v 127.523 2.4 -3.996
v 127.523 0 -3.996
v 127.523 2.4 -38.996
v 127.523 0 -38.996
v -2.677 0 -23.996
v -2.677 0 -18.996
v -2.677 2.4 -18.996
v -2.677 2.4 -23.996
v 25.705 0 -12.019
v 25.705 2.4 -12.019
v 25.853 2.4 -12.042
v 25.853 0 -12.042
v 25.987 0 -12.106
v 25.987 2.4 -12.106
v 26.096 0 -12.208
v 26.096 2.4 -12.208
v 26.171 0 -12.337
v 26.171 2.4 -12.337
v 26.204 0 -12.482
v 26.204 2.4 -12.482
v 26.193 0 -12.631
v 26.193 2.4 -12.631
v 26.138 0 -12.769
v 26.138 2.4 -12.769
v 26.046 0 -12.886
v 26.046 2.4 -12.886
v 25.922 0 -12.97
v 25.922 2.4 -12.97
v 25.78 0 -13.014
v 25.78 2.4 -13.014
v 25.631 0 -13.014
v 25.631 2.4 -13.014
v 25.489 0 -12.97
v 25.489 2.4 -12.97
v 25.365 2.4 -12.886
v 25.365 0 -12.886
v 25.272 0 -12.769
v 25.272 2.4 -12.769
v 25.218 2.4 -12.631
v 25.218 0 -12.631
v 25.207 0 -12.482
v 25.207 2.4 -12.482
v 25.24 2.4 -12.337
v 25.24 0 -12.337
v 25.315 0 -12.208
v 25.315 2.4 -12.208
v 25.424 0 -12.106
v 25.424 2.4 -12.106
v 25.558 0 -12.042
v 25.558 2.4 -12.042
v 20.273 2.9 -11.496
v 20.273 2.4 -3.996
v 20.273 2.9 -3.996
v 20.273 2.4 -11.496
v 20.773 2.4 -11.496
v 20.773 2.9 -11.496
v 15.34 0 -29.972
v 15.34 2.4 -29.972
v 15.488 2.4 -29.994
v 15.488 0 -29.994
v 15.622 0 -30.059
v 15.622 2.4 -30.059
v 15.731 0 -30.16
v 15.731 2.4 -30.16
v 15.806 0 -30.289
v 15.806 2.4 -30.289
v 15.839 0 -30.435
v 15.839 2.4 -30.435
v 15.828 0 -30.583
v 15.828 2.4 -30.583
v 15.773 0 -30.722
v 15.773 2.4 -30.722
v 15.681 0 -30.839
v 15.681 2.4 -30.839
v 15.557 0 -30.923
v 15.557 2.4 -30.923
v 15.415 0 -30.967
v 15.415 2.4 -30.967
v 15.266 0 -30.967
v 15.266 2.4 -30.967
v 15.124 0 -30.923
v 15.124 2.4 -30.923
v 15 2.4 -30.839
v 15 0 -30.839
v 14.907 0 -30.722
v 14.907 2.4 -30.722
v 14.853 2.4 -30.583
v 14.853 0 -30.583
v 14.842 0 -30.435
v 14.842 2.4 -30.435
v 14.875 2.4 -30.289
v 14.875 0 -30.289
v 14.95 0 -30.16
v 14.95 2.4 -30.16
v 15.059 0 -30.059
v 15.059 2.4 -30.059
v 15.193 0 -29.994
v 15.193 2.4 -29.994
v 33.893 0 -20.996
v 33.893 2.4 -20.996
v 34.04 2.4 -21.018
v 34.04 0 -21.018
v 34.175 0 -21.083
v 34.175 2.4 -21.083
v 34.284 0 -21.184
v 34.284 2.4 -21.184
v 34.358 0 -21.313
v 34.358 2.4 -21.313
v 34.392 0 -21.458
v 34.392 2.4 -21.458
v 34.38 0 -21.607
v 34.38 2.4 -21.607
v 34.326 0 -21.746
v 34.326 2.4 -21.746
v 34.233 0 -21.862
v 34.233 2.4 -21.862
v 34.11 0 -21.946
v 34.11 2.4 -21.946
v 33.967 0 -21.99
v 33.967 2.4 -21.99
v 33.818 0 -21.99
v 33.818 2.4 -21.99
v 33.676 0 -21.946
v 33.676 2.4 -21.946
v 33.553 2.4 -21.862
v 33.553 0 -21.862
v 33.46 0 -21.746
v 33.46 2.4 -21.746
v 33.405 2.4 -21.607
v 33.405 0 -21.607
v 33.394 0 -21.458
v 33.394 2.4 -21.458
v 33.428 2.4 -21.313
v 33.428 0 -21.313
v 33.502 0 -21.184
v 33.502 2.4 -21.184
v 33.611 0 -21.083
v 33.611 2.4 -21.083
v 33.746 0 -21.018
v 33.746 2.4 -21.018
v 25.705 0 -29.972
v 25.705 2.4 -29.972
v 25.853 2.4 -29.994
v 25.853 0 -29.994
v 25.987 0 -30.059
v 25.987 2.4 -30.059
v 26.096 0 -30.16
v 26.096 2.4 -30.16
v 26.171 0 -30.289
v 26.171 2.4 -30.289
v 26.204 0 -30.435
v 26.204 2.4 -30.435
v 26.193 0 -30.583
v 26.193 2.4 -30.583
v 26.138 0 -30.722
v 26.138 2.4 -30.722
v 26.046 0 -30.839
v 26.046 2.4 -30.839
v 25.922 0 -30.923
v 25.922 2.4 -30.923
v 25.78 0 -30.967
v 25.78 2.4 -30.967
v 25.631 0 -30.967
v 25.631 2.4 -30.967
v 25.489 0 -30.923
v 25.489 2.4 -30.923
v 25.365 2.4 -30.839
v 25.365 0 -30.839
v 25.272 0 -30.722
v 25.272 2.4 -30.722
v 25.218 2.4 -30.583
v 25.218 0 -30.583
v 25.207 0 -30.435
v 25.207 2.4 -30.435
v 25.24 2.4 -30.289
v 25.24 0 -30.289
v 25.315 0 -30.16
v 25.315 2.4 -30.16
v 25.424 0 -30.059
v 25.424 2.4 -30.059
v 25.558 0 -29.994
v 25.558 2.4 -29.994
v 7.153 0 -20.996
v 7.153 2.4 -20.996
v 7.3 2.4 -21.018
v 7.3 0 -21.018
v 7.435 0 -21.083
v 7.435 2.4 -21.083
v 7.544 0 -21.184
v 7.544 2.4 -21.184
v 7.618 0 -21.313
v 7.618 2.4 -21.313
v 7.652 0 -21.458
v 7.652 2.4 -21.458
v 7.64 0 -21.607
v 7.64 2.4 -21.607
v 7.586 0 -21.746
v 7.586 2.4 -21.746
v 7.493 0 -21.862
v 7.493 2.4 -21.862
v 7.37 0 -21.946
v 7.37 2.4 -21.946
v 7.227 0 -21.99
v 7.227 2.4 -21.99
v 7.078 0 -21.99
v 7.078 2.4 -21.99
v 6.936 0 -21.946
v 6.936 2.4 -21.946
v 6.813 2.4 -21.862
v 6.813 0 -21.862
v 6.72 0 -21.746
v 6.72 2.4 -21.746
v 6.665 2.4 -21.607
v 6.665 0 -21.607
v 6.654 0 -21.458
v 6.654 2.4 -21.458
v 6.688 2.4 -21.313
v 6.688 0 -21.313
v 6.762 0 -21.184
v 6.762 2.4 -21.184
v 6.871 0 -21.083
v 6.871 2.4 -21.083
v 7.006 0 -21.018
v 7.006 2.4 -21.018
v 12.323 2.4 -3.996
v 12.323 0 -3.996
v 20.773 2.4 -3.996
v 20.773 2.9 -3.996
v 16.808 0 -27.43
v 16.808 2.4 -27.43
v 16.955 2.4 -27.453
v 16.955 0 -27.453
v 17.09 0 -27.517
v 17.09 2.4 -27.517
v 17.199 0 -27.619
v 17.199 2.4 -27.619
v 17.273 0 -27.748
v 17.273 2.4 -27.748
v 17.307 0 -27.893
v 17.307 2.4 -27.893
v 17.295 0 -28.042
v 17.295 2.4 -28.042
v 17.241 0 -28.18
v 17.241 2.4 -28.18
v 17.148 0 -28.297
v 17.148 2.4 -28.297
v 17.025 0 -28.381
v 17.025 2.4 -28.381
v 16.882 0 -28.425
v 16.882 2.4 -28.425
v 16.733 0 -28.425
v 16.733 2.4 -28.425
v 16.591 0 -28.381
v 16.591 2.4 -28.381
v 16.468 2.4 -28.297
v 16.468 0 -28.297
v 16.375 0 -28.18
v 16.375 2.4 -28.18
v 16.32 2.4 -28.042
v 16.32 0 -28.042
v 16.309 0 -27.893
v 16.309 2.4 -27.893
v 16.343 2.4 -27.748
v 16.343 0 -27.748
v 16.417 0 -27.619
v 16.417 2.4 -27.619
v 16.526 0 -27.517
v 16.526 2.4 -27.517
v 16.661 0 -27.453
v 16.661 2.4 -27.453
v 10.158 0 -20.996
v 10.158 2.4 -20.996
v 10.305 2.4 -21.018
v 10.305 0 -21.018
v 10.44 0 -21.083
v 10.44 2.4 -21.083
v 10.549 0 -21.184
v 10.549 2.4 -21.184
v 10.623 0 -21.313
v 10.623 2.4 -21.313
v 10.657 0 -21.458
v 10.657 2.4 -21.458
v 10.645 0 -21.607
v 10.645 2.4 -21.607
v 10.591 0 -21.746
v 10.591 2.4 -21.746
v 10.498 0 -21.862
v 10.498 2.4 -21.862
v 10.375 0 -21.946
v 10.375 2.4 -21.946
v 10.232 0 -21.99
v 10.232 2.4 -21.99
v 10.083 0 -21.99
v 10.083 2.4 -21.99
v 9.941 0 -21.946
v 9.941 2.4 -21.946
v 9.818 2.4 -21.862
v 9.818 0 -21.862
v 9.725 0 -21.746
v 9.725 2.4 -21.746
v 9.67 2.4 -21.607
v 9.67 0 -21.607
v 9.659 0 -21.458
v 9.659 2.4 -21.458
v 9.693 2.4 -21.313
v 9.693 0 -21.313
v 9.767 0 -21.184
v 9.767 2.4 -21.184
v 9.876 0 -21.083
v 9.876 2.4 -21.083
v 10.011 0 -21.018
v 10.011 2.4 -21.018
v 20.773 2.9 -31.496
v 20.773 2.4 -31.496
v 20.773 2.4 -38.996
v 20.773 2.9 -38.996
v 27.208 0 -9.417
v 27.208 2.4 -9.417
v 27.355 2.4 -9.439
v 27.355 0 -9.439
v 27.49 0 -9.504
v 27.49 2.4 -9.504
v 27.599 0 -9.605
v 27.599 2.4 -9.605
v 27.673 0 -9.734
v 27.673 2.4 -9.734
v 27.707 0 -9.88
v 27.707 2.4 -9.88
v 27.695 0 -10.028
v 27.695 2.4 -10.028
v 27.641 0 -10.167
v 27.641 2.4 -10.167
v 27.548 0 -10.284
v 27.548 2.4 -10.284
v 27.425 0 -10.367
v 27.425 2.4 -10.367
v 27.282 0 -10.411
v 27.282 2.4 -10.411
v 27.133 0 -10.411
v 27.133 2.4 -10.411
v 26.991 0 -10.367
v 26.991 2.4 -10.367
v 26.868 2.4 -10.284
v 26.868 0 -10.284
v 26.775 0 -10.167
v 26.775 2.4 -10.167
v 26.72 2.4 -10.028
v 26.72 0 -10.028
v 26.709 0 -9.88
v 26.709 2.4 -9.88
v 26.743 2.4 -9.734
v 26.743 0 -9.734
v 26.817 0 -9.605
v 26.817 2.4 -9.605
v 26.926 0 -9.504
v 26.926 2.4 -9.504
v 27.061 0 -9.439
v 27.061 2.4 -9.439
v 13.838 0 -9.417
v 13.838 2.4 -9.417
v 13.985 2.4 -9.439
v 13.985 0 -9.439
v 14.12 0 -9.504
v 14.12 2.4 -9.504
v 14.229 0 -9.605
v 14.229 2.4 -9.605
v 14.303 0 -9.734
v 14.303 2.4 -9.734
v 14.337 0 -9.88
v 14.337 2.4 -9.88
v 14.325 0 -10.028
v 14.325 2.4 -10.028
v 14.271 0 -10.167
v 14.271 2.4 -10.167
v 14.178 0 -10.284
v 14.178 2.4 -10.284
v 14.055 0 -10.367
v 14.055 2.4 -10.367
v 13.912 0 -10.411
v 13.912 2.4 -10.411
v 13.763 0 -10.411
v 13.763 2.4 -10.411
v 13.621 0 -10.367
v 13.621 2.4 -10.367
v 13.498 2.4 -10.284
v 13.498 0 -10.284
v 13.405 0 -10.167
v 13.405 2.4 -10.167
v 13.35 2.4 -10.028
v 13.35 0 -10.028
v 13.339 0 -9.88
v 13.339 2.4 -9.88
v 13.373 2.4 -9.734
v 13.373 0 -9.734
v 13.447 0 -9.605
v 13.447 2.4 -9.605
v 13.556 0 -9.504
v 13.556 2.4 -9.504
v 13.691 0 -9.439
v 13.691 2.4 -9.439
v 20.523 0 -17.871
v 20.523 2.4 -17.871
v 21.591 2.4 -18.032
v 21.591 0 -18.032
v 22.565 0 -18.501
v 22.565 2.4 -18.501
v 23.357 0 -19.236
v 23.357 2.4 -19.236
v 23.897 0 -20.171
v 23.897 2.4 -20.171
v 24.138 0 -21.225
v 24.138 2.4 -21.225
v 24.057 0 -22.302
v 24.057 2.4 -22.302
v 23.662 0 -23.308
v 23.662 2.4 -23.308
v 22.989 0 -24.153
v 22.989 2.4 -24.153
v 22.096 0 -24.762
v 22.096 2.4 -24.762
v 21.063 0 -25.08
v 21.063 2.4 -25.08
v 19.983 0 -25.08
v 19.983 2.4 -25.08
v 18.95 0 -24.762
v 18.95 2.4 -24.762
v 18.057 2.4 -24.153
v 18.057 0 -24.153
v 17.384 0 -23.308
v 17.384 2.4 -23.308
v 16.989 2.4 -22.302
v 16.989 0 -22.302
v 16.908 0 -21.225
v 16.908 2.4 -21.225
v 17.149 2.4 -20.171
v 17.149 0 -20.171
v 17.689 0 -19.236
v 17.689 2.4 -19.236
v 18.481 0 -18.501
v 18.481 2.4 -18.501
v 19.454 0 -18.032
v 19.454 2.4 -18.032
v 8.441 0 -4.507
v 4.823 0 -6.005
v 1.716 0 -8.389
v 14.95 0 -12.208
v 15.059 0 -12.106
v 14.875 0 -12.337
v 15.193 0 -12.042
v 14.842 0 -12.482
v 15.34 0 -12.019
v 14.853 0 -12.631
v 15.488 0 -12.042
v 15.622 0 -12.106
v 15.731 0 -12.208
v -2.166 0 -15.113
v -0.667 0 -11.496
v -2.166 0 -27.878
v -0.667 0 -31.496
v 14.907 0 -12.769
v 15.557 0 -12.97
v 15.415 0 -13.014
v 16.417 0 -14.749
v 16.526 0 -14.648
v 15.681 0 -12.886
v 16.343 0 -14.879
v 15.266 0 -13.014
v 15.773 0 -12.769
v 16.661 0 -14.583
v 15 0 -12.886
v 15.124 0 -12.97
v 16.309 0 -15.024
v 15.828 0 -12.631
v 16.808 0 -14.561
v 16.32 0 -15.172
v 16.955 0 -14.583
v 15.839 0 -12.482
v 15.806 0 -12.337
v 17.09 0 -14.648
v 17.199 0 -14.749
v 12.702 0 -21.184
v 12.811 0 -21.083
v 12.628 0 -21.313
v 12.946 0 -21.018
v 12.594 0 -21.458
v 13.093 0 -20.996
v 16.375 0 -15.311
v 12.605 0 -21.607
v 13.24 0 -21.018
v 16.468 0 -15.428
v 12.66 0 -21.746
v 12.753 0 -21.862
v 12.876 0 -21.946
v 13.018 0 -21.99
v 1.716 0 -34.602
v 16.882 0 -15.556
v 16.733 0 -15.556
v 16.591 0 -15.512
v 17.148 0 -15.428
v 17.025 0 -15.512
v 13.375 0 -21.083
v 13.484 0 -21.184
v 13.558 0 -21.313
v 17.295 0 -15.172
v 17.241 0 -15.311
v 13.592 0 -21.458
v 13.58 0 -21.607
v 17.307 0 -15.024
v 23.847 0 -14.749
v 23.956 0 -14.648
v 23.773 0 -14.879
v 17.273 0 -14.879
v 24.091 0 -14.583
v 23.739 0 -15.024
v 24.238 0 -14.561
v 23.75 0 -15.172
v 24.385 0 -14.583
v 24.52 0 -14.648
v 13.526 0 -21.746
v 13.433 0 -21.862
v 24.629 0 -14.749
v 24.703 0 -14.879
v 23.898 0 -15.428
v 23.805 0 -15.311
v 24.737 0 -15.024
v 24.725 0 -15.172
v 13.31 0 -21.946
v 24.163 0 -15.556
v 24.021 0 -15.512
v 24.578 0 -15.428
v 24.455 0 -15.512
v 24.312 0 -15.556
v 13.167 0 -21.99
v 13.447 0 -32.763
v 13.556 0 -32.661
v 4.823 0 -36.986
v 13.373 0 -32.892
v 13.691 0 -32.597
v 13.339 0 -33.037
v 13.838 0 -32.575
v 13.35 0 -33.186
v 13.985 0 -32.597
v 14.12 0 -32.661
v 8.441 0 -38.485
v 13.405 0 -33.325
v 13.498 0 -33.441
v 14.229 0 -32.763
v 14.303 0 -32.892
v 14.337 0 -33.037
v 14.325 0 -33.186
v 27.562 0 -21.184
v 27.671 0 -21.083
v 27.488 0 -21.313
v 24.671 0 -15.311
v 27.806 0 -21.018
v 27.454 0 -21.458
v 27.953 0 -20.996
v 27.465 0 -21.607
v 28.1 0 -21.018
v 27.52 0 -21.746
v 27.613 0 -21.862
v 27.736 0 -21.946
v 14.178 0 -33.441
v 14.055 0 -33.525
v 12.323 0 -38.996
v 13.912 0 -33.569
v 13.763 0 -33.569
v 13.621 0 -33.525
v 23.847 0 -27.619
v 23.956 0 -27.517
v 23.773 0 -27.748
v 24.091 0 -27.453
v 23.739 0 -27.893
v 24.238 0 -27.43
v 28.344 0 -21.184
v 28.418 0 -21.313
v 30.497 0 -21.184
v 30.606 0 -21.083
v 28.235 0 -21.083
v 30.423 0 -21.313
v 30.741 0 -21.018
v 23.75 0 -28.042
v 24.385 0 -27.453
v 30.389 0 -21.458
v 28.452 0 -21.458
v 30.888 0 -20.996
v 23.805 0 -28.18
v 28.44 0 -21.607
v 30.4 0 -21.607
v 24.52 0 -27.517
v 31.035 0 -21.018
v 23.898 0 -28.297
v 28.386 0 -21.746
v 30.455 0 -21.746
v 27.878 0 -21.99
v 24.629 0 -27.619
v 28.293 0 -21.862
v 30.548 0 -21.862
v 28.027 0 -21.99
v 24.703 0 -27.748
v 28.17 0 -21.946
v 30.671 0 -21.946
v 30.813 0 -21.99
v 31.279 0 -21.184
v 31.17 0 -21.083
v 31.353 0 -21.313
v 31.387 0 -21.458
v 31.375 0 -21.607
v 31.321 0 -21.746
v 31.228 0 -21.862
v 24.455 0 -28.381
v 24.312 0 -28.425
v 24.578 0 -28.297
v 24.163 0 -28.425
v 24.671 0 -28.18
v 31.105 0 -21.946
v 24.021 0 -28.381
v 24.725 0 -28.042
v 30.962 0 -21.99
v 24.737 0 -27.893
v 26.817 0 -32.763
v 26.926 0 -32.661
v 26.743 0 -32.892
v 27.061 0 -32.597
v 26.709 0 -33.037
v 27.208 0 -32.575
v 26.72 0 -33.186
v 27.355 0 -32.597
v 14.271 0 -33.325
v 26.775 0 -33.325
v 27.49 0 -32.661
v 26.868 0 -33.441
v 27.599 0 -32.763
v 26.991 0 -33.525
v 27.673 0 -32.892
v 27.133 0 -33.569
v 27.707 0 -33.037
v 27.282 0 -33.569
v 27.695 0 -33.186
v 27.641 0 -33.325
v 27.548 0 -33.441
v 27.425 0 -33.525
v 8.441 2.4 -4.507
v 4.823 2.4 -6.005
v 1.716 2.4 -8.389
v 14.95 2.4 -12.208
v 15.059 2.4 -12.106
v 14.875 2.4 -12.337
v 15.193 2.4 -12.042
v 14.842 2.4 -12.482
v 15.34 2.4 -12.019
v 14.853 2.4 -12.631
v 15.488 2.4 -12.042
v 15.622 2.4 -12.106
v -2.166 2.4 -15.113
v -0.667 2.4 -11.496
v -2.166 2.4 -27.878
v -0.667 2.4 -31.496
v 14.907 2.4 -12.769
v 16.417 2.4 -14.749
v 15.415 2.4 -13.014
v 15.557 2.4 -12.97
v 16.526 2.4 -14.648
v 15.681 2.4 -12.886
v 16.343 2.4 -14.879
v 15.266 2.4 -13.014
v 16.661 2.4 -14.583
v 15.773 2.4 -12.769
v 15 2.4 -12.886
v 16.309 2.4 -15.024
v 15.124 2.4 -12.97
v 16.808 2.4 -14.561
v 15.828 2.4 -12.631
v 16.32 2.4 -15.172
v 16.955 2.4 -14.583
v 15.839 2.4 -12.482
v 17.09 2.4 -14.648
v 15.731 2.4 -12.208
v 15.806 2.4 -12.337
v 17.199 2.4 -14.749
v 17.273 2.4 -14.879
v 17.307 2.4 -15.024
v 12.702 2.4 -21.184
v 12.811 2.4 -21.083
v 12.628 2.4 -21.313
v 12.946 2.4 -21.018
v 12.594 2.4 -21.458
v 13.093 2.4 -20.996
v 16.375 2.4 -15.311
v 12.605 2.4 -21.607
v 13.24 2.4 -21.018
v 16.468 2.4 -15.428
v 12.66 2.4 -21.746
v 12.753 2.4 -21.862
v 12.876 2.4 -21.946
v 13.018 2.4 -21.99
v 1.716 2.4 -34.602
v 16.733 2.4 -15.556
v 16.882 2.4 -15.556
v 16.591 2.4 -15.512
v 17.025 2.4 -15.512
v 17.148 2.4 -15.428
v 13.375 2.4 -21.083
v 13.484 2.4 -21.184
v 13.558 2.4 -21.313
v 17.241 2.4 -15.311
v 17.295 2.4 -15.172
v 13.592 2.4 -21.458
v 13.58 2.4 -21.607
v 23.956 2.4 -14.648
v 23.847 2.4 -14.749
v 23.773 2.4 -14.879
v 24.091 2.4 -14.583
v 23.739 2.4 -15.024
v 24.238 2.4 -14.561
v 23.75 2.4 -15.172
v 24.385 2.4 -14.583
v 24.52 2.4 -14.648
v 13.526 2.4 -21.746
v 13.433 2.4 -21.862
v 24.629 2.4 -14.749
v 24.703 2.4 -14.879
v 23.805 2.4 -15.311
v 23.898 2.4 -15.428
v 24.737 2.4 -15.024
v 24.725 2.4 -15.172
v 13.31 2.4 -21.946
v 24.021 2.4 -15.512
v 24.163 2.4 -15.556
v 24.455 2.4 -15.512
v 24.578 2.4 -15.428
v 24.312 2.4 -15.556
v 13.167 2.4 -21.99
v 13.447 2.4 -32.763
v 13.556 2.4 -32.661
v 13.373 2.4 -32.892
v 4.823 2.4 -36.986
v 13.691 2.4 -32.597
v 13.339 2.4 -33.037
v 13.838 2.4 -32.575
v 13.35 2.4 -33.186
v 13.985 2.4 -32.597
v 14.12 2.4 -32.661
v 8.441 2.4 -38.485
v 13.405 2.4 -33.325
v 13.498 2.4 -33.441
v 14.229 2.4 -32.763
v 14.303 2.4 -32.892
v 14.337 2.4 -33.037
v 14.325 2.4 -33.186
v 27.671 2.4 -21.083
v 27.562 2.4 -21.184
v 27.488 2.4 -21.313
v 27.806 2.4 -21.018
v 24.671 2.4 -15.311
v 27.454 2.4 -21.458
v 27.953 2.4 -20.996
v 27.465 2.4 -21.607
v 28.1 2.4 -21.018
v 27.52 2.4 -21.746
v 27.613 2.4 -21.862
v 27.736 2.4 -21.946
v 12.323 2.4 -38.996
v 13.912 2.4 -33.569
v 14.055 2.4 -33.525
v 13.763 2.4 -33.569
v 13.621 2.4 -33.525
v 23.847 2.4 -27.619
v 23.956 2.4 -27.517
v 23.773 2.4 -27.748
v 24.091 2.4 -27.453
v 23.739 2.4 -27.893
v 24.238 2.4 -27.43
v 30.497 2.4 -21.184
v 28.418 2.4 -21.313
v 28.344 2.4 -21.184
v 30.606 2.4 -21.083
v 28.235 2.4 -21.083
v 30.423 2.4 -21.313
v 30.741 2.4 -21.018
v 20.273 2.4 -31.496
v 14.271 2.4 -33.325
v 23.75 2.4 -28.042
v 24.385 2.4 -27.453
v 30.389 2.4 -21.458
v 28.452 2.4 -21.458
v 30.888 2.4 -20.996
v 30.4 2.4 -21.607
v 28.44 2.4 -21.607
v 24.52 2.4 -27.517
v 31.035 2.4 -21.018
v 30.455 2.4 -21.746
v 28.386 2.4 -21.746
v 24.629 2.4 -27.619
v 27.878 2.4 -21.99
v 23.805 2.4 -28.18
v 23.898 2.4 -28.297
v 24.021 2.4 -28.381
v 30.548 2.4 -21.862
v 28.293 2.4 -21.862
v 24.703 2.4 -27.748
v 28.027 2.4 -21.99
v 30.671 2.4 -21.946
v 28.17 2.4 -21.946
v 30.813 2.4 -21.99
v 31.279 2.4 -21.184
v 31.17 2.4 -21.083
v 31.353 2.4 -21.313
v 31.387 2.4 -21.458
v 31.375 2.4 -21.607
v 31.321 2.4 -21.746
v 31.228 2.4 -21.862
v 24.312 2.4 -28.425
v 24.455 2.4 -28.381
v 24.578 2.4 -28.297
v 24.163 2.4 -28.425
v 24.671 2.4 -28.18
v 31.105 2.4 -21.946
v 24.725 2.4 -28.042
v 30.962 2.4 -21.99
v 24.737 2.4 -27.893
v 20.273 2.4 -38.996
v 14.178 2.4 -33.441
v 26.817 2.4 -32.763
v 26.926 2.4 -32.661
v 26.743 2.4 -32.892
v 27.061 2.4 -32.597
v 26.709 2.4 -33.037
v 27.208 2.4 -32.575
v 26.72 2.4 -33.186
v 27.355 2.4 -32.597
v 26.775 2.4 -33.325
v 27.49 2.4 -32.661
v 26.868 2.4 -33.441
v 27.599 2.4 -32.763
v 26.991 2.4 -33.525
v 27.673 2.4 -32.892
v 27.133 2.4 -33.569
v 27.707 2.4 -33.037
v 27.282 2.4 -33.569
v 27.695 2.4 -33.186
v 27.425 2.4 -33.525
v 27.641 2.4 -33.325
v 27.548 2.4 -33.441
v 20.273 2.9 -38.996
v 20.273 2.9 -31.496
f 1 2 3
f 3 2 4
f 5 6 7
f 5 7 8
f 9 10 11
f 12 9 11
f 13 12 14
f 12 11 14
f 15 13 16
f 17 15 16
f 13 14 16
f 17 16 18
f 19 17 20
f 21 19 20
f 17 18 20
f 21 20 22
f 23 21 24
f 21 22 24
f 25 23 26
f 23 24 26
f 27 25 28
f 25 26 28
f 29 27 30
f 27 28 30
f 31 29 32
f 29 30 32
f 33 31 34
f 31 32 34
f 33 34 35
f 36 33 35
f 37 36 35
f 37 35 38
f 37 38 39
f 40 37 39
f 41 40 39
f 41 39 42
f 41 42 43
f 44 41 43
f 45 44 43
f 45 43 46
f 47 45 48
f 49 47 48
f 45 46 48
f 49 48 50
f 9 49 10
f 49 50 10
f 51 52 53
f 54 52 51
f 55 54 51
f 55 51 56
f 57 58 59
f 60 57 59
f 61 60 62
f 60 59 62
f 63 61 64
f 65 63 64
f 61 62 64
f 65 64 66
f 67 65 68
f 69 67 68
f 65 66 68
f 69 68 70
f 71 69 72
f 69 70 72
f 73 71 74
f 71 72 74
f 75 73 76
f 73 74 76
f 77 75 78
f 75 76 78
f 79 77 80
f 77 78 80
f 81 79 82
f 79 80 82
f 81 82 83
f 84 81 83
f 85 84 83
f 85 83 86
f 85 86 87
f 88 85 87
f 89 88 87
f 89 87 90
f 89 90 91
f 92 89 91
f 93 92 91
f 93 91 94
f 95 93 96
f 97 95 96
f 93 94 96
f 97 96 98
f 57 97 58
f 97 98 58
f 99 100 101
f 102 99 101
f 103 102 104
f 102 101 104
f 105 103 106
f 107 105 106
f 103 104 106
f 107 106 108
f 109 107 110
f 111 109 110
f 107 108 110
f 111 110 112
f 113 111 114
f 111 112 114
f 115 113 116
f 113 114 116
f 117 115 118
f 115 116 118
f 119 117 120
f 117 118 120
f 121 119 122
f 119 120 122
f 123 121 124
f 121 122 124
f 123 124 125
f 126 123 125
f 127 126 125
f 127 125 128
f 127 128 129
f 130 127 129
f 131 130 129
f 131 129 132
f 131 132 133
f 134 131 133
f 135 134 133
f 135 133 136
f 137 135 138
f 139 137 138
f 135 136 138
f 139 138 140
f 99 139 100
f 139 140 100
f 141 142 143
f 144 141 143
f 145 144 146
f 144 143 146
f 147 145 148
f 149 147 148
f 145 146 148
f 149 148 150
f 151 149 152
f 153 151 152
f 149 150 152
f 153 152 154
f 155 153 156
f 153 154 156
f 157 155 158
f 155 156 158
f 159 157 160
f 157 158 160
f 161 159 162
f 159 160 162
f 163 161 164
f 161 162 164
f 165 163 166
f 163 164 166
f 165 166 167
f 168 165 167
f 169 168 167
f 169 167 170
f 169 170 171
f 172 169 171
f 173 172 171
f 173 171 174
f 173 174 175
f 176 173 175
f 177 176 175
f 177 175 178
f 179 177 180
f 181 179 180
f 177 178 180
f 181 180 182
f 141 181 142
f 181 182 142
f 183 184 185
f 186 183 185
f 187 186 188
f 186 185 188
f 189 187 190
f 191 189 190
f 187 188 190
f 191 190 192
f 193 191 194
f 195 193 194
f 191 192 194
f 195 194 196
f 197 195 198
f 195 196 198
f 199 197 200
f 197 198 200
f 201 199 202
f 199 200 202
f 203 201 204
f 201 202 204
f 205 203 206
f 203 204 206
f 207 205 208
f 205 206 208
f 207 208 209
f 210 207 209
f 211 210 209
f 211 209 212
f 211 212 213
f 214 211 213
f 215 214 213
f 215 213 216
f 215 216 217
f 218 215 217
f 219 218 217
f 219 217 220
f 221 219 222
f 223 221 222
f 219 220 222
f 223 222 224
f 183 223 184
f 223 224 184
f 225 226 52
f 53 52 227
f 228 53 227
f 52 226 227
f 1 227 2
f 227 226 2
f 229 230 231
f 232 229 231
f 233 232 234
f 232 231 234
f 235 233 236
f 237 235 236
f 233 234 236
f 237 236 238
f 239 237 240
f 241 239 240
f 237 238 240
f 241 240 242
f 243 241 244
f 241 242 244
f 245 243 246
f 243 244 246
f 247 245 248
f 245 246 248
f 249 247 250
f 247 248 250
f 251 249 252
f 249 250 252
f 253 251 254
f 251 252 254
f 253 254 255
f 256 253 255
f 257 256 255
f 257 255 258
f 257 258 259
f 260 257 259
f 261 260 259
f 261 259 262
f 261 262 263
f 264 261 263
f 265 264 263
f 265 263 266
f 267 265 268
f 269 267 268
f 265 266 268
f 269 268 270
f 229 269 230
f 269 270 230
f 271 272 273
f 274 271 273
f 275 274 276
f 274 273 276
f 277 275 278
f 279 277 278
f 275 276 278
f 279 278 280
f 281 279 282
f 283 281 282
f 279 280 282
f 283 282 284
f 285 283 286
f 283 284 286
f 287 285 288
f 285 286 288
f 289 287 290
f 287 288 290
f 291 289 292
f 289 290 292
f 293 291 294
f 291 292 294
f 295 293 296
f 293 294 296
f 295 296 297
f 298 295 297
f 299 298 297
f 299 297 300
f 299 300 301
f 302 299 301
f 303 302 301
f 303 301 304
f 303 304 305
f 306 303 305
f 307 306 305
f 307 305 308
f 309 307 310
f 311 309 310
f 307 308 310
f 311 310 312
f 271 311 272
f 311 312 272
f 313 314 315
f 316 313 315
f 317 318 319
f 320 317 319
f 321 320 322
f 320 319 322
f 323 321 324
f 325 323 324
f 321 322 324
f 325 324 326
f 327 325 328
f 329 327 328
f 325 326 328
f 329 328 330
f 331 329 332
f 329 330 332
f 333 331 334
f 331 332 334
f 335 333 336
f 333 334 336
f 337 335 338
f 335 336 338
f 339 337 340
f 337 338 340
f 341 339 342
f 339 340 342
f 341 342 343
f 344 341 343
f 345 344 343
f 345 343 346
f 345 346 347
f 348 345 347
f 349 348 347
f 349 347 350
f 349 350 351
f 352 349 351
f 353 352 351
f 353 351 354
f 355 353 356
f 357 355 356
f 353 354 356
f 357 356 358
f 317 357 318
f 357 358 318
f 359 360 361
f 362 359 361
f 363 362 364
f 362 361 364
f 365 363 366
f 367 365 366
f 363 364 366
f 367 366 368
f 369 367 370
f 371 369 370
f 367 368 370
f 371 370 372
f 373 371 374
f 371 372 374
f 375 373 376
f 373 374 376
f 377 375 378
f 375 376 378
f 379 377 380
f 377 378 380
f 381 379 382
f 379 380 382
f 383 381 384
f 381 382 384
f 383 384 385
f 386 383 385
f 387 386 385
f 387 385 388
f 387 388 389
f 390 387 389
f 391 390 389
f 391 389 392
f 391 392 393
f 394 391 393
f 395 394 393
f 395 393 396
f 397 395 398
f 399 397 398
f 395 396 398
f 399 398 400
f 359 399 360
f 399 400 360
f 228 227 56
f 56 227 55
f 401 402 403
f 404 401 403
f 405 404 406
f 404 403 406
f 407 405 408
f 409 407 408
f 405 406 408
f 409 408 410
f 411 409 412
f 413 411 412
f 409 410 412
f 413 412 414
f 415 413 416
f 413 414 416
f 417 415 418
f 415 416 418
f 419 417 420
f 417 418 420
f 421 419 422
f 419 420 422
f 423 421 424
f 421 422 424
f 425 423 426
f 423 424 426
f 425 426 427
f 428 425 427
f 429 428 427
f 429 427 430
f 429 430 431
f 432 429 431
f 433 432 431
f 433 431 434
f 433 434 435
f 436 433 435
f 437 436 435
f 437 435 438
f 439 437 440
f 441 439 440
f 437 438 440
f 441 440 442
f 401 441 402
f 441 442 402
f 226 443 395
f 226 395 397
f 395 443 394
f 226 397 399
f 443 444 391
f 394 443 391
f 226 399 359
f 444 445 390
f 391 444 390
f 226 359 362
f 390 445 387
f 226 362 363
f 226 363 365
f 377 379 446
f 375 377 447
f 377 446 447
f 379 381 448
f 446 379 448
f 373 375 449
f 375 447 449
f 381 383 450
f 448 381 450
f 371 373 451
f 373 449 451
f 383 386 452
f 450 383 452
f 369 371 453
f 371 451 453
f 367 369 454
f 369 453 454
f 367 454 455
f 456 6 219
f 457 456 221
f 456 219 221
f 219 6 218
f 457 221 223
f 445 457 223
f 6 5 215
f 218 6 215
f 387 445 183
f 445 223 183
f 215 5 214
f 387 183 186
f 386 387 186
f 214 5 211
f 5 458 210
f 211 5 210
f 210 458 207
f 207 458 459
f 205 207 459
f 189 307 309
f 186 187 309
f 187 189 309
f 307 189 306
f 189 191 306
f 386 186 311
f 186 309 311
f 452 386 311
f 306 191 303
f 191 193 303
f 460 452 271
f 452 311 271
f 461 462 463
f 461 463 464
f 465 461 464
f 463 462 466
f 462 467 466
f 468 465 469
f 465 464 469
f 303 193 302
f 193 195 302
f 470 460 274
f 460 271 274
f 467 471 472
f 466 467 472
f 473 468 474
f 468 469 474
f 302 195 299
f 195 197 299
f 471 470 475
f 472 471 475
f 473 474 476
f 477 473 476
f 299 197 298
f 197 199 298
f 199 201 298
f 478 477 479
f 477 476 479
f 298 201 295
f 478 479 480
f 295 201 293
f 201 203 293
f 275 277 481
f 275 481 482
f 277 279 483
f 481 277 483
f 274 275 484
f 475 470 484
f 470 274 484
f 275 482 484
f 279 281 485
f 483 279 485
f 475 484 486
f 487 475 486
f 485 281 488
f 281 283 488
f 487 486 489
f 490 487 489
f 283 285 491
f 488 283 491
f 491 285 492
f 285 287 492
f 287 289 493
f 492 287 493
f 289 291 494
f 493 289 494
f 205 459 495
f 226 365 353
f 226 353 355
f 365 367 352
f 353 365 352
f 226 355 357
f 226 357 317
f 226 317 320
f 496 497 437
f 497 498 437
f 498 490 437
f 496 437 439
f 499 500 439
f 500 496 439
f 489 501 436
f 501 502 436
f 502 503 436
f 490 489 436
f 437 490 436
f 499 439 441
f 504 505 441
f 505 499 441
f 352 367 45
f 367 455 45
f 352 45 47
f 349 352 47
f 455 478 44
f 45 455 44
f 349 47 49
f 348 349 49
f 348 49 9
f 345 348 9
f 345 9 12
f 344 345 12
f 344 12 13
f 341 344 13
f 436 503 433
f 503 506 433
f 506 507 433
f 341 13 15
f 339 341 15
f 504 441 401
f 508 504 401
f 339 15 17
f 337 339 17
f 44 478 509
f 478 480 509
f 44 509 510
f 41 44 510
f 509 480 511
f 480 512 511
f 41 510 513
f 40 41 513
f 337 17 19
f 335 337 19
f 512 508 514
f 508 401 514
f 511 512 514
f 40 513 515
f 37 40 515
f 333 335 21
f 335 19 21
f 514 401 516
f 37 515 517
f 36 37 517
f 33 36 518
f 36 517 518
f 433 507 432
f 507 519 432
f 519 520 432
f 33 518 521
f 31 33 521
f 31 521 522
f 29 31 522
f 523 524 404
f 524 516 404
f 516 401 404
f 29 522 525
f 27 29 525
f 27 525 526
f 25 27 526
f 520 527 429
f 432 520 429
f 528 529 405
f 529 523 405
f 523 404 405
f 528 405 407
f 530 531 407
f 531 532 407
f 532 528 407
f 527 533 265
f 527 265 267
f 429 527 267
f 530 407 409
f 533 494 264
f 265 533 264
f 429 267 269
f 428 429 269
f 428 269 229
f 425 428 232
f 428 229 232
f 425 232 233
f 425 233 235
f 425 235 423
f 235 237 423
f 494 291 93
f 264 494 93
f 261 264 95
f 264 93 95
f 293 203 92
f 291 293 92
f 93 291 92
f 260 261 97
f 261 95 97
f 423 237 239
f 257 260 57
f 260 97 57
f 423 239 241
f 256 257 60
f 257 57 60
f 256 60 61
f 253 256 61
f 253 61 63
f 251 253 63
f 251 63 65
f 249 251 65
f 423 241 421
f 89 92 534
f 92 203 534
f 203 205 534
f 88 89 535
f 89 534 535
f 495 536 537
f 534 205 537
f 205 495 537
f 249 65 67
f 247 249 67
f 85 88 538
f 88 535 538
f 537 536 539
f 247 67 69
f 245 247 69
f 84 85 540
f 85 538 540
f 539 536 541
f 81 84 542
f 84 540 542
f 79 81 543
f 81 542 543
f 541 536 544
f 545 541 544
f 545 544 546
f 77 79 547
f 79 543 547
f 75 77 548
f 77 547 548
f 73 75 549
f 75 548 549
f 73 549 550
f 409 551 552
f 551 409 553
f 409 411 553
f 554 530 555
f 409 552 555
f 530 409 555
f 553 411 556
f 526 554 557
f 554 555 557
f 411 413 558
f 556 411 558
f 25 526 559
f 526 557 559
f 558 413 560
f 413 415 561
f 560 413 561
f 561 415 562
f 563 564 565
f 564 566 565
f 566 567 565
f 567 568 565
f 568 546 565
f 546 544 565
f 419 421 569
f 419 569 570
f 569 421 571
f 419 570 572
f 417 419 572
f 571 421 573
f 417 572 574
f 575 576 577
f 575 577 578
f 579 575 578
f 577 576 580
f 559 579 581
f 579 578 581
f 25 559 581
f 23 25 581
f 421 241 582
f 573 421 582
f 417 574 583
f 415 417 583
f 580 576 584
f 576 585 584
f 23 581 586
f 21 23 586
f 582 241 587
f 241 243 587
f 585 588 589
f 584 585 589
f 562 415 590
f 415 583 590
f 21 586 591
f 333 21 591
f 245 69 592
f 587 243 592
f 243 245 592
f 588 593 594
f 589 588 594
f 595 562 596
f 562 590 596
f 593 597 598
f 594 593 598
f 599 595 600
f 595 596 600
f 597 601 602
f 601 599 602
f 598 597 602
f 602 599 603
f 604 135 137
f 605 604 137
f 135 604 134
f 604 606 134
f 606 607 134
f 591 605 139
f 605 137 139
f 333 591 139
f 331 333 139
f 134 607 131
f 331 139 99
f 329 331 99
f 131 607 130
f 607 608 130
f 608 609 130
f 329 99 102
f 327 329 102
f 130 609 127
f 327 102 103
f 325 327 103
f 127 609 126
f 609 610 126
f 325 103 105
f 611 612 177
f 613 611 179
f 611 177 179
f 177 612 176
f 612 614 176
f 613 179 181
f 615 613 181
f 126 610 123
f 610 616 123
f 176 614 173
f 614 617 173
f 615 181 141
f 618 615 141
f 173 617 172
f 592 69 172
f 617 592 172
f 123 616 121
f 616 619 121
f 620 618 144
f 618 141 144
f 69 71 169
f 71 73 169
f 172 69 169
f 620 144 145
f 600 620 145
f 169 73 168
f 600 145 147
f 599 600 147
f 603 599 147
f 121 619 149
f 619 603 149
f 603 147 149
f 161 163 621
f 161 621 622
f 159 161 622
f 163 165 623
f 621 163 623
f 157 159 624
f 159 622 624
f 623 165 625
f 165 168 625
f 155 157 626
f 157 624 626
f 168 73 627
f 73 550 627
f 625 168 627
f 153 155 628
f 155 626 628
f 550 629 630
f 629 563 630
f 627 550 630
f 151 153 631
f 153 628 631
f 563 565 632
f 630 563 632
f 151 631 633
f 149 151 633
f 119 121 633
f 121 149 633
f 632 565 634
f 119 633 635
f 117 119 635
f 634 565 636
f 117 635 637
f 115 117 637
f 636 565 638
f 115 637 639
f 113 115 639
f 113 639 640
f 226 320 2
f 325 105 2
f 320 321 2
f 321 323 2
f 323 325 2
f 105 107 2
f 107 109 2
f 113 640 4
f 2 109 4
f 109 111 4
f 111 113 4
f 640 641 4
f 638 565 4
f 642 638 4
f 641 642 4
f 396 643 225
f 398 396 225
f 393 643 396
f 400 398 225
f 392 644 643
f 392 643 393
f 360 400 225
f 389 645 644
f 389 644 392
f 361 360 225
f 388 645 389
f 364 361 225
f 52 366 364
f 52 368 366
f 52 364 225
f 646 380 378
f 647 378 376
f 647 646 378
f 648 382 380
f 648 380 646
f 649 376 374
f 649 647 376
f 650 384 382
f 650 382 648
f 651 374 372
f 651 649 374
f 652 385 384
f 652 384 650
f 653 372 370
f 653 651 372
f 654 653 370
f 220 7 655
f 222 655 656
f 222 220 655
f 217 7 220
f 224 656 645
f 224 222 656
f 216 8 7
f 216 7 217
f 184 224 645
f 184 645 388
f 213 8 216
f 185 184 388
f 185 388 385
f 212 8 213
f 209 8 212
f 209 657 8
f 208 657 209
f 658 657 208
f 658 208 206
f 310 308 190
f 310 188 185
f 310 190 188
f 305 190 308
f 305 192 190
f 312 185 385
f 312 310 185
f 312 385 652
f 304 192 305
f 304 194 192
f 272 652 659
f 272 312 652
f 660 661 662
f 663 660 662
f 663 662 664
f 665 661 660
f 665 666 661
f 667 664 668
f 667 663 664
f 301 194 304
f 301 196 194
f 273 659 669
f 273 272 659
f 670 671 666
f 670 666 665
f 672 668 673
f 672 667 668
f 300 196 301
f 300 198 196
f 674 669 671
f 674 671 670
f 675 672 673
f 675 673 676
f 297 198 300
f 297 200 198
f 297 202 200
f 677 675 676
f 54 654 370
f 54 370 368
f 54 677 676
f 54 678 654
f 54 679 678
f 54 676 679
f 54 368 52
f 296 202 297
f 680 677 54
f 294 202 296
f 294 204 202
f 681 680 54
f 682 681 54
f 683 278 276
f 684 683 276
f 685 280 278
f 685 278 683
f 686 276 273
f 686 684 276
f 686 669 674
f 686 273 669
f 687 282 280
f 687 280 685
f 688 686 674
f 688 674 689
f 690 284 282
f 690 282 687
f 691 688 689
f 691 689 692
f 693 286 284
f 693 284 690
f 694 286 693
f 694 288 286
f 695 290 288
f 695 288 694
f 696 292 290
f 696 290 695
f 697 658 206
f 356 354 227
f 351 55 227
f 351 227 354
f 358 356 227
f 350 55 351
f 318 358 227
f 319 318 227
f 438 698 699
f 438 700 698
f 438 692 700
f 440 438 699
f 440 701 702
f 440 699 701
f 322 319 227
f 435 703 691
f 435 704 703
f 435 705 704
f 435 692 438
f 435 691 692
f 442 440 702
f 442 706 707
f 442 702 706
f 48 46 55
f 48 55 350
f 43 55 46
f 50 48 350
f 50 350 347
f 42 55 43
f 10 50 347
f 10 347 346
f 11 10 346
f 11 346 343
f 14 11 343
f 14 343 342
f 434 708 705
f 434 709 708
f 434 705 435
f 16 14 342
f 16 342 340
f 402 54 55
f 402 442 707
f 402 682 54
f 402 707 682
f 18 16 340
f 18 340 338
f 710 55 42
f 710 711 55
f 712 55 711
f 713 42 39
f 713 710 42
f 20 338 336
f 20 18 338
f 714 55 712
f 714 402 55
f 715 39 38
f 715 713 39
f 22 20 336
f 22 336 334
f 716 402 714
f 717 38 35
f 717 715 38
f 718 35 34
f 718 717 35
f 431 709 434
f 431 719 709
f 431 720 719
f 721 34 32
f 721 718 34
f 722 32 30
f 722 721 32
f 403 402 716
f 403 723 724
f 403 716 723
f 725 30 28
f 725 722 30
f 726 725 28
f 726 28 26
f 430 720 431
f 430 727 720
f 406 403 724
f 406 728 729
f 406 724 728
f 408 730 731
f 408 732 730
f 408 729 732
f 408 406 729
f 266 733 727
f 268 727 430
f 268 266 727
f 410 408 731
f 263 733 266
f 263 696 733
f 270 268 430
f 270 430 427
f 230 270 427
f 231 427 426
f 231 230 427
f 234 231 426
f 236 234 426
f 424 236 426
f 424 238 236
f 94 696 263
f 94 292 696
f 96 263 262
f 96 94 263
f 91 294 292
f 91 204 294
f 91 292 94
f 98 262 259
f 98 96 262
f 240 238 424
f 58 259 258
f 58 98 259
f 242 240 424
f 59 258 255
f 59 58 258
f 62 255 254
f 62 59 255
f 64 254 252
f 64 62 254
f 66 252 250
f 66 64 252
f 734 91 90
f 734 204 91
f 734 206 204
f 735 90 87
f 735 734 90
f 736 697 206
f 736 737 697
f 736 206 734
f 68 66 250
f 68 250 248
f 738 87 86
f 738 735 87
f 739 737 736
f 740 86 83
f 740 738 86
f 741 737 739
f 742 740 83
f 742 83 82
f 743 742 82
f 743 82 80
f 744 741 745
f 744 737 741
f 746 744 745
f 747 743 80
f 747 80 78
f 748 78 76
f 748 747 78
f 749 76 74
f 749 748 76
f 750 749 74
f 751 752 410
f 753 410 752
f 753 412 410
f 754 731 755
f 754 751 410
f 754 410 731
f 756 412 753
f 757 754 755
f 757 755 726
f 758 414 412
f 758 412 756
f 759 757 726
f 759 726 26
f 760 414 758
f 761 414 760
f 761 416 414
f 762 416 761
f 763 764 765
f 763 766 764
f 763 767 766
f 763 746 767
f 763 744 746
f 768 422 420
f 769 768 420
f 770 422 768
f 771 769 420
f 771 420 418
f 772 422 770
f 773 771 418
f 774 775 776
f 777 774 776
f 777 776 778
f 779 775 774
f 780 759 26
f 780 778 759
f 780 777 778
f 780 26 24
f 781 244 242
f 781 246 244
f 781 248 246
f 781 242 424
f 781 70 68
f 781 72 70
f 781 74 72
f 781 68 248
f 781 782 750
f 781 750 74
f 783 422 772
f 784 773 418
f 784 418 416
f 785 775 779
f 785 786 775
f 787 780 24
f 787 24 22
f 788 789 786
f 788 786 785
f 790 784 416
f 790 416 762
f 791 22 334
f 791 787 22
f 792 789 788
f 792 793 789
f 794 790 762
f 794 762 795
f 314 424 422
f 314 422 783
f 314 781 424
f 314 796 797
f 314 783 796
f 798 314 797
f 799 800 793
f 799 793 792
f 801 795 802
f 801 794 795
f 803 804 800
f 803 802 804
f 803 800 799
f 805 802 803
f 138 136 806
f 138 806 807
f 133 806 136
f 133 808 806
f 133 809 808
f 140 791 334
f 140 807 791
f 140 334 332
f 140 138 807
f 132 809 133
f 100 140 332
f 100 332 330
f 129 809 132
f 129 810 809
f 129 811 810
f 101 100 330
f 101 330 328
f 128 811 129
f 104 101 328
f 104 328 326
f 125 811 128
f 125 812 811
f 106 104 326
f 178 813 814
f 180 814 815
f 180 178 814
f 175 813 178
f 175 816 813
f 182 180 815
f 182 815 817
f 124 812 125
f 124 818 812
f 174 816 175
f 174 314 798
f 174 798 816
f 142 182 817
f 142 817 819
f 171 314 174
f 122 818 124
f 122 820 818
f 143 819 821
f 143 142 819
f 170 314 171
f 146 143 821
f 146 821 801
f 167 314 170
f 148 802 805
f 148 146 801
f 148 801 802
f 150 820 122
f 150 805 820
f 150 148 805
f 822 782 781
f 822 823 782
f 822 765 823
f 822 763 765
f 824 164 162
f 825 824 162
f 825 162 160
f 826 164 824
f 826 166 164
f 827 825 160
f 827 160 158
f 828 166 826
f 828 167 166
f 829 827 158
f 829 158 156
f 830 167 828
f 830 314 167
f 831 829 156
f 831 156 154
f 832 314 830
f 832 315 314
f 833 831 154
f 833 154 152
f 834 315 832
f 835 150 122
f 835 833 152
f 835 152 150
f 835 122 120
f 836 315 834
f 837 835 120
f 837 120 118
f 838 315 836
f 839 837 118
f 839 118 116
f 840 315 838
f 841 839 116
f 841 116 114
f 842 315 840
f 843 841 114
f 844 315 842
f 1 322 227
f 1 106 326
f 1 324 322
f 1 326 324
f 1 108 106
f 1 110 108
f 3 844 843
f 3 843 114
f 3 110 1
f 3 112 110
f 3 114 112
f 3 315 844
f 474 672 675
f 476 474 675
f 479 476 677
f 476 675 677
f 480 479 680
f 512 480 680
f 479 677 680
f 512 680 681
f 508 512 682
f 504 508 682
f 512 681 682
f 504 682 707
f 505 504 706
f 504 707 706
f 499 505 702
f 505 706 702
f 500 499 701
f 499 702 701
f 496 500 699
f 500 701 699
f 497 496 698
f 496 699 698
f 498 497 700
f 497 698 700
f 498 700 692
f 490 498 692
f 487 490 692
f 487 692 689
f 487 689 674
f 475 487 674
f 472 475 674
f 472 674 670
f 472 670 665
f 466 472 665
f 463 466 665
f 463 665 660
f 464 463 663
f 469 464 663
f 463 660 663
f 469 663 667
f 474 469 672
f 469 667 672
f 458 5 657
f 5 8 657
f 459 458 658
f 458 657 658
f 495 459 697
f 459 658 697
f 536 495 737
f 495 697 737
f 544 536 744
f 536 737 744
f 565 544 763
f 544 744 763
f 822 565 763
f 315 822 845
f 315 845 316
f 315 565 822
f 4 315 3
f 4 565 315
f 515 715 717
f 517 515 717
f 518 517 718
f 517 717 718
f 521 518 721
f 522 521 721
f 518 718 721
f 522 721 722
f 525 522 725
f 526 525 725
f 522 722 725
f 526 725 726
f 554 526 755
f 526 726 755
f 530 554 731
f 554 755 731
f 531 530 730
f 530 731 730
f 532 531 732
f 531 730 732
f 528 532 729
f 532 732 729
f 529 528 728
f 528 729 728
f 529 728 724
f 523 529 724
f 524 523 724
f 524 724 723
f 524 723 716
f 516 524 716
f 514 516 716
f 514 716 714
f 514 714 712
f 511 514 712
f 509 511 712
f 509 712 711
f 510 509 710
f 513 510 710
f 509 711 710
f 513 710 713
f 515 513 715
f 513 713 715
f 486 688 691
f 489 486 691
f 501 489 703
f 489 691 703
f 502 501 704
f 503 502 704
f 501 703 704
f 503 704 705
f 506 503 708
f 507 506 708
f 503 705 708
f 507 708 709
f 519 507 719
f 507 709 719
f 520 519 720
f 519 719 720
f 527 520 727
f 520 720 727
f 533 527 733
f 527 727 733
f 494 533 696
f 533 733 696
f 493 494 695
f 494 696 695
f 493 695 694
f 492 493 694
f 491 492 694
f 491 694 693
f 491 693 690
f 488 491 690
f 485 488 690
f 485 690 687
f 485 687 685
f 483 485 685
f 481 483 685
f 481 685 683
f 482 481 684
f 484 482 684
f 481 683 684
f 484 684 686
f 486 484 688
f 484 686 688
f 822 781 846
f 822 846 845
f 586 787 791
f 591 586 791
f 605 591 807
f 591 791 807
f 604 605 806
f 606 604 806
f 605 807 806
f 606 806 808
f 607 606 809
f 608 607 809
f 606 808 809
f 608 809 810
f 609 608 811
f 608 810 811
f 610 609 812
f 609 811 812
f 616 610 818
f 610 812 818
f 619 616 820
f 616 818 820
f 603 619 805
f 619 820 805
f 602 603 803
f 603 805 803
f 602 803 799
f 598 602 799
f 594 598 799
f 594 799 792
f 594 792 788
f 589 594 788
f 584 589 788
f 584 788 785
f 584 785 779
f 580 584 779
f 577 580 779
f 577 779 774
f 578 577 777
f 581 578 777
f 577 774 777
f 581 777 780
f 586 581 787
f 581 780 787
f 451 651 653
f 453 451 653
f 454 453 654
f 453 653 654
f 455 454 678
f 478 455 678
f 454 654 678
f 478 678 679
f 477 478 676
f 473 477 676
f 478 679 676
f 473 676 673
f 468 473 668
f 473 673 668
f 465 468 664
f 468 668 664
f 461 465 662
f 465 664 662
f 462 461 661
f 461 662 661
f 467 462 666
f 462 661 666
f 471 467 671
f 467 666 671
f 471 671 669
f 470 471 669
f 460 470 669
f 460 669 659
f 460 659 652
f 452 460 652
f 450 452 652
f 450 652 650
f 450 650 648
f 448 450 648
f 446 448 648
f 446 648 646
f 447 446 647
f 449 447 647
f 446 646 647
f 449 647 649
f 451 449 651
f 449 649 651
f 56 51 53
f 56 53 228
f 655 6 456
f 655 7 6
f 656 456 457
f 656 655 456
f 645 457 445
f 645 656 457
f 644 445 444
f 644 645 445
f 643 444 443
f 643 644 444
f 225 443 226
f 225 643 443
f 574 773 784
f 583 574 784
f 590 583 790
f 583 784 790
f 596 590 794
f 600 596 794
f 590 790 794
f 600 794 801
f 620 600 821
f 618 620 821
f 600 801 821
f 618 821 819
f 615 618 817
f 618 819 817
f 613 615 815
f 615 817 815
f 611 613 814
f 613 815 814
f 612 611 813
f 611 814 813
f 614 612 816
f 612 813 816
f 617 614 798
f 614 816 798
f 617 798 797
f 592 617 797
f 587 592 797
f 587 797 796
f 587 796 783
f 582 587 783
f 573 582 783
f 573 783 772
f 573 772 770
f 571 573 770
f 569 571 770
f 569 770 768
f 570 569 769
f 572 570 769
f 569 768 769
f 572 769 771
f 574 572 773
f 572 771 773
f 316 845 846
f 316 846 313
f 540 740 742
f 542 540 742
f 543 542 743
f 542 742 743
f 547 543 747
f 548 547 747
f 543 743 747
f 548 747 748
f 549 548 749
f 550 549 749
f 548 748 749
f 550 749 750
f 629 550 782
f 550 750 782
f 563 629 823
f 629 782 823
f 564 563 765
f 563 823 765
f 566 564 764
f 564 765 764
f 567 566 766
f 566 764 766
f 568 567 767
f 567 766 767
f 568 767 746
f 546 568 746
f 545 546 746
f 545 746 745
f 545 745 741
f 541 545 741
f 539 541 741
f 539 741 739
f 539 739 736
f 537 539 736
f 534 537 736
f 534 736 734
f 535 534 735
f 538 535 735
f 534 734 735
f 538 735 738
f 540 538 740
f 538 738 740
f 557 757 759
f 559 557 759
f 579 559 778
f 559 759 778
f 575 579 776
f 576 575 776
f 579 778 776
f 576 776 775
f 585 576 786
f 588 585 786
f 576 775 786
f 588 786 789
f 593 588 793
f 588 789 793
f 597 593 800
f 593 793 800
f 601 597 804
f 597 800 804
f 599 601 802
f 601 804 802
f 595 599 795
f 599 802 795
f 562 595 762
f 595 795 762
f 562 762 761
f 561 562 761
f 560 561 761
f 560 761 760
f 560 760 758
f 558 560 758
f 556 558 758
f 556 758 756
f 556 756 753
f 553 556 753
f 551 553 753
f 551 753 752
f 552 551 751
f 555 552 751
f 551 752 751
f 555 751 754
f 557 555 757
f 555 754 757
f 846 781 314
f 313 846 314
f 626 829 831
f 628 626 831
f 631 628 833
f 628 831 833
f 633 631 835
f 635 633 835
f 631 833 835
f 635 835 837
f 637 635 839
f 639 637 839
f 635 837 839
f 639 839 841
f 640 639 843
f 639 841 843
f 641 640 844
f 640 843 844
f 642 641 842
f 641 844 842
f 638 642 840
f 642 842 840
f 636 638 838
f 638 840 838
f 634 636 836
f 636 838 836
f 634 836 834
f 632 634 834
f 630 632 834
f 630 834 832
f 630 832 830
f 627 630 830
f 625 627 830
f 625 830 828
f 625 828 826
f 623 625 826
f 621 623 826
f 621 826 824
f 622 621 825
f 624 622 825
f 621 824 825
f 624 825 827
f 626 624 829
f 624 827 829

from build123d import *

# Parameters (mm, degrees)
SKETCH1_W           = 130.2
SKETCH1_H           = 35
BOSS_EXTRUDE1_DEPTH = 2.4
SKETCH2_R           = 0.5
SKETCH2_R_2         = 3.625
CUT_EXTRUDE1_DEPTH  = 2.4
SKETCH6_W           = 0.5
SKETCH6_H           = 7.5
BOSS_EXTRUDE3_DEPTH = 0.5
FILLET3_R           = 15


with BuildPart() as part:
    # Sketch1 → Boss-Extrude1 (new body)
    with BuildSketch(Plane(origin=(0, 0, 0), x_dir=(1, 0, 0), z_dir=(0, 1, 0))):
        with Locations((62.422946176, 21.495750708)):
            Rectangle(SKETCH1_W, SKETCH1_H)
    extrude(amount=BOSS_EXTRUDE1_DEPTH)

    # Sketch2 → Cut-Extrude1 (cut)
    with BuildSketch(Plane(origin=(0, 2.4, 0), x_dir=(1, 0, 0), z_dir=(0, 1, 0))):
        with Locations(Location((16.807946176, 27.930319458, 0), (0, 0, 270))):
            Circle(SKETCH2_R)
        with Locations(Location((15.340446176, 30.472104018, 0), (0, 0, 270))):
            Circle(SKETCH2_R)
        with Locations(Location((13.837946176, 33.074510357, 0), (0, 0, 270))):
            Circle(SKETCH2_R)
        with Locations(Location((24.237946176, 27.930319458, 0), (0, 0, 270))):
            Circle(SKETCH2_R)
        with Locations(Location((20.522946176, 21.495750708, 0), (0, 0, 270))):
            Circle(SKETCH2_R_2)
        with Locations(Location((13.092946176, 21.495750708, 0), (0, 0, 270))):
            Circle(SKETCH2_R)
        with Locations(Location((10.157946176, 21.495750708, 0), (0, 0, 270))):
            Circle(SKETCH2_R)
        with Locations(Location((7.152946176, 21.495750708, 0), (0, 0, 270))):
            Circle(SKETCH2_R)
        with Locations(Location((25.705446176, 30.472104018, 0), (0, 0, 270))):
            Circle(SKETCH2_R)
        with Locations(Location((27.207946176, 33.074510357, 0), (0, 0, 270))):
            Circle(SKETCH2_R)
        with Locations(Location((27.952946176, 21.495750708, 0), (0, 0, 270))):
            Circle(SKETCH2_R)
        with Locations(Location((30.887946176, 21.495750708, 0), (0, 0, 270))):
            Circle(SKETCH2_R)
        with Locations(Location((33.892946176, 21.495750708, 0), (0, 0, 270))):
            Circle(SKETCH2_R)
        with Locations(Location((24.237946176, 15.061181958, 0), (0, 0, 270))):
            Circle(SKETCH2_R)
        with Locations(Location((25.705446176, 12.519397398, 0), (0, 0, 270))):
            Circle(SKETCH2_R)
        with Locations(Location((27.207946176, 9.91699106, 0), (0, 0, 270))):
            Circle(SKETCH2_R)
        with Locations(Location((16.807946176, 15.061181958, 0), (0, 0, 270))):
            Circle(SKETCH2_R)
        with Locations(Location((15.340446176, 12.519397398, 0), (0, 0, 270))):
            Circle(SKETCH2_R)
        with Locations(Location((13.837946176, 9.91699106, 0), (0, 0, 270))):
            Circle(SKETCH2_R)
    extrude(amount=-CUT_EXTRUDE1_DEPTH, mode=Mode.SUBTRACT)

    # Sketch6 → Boss-Extrude3 (add)
    with BuildSketch(Plane(origin=(0, 2.4, 0), x_dir=(1, 0, 0), z_dir=(0, 1, 0))):
        with Locations((20.522946176, 7.745750708)):
            Rectangle(SKETCH6_W, SKETCH6_H)
        with Locations((20.522946176, 35.245750708)):
            Rectangle(SKETCH6_W, SKETCH6_H)
    extrude(amount=BOSS_EXTRUDE3_DEPTH)

    # Fillet3
    fillet3_edges = [part.edges().sort_by_distance(p)[0] for p in [
        (-2.677053824, 1.2, -38.995750708),
        (-2.677053824, 1.2, -3.995750708),
    ]]
    fillet(fillet3_edges, radius=FILLET3_R)


solid = part.part
